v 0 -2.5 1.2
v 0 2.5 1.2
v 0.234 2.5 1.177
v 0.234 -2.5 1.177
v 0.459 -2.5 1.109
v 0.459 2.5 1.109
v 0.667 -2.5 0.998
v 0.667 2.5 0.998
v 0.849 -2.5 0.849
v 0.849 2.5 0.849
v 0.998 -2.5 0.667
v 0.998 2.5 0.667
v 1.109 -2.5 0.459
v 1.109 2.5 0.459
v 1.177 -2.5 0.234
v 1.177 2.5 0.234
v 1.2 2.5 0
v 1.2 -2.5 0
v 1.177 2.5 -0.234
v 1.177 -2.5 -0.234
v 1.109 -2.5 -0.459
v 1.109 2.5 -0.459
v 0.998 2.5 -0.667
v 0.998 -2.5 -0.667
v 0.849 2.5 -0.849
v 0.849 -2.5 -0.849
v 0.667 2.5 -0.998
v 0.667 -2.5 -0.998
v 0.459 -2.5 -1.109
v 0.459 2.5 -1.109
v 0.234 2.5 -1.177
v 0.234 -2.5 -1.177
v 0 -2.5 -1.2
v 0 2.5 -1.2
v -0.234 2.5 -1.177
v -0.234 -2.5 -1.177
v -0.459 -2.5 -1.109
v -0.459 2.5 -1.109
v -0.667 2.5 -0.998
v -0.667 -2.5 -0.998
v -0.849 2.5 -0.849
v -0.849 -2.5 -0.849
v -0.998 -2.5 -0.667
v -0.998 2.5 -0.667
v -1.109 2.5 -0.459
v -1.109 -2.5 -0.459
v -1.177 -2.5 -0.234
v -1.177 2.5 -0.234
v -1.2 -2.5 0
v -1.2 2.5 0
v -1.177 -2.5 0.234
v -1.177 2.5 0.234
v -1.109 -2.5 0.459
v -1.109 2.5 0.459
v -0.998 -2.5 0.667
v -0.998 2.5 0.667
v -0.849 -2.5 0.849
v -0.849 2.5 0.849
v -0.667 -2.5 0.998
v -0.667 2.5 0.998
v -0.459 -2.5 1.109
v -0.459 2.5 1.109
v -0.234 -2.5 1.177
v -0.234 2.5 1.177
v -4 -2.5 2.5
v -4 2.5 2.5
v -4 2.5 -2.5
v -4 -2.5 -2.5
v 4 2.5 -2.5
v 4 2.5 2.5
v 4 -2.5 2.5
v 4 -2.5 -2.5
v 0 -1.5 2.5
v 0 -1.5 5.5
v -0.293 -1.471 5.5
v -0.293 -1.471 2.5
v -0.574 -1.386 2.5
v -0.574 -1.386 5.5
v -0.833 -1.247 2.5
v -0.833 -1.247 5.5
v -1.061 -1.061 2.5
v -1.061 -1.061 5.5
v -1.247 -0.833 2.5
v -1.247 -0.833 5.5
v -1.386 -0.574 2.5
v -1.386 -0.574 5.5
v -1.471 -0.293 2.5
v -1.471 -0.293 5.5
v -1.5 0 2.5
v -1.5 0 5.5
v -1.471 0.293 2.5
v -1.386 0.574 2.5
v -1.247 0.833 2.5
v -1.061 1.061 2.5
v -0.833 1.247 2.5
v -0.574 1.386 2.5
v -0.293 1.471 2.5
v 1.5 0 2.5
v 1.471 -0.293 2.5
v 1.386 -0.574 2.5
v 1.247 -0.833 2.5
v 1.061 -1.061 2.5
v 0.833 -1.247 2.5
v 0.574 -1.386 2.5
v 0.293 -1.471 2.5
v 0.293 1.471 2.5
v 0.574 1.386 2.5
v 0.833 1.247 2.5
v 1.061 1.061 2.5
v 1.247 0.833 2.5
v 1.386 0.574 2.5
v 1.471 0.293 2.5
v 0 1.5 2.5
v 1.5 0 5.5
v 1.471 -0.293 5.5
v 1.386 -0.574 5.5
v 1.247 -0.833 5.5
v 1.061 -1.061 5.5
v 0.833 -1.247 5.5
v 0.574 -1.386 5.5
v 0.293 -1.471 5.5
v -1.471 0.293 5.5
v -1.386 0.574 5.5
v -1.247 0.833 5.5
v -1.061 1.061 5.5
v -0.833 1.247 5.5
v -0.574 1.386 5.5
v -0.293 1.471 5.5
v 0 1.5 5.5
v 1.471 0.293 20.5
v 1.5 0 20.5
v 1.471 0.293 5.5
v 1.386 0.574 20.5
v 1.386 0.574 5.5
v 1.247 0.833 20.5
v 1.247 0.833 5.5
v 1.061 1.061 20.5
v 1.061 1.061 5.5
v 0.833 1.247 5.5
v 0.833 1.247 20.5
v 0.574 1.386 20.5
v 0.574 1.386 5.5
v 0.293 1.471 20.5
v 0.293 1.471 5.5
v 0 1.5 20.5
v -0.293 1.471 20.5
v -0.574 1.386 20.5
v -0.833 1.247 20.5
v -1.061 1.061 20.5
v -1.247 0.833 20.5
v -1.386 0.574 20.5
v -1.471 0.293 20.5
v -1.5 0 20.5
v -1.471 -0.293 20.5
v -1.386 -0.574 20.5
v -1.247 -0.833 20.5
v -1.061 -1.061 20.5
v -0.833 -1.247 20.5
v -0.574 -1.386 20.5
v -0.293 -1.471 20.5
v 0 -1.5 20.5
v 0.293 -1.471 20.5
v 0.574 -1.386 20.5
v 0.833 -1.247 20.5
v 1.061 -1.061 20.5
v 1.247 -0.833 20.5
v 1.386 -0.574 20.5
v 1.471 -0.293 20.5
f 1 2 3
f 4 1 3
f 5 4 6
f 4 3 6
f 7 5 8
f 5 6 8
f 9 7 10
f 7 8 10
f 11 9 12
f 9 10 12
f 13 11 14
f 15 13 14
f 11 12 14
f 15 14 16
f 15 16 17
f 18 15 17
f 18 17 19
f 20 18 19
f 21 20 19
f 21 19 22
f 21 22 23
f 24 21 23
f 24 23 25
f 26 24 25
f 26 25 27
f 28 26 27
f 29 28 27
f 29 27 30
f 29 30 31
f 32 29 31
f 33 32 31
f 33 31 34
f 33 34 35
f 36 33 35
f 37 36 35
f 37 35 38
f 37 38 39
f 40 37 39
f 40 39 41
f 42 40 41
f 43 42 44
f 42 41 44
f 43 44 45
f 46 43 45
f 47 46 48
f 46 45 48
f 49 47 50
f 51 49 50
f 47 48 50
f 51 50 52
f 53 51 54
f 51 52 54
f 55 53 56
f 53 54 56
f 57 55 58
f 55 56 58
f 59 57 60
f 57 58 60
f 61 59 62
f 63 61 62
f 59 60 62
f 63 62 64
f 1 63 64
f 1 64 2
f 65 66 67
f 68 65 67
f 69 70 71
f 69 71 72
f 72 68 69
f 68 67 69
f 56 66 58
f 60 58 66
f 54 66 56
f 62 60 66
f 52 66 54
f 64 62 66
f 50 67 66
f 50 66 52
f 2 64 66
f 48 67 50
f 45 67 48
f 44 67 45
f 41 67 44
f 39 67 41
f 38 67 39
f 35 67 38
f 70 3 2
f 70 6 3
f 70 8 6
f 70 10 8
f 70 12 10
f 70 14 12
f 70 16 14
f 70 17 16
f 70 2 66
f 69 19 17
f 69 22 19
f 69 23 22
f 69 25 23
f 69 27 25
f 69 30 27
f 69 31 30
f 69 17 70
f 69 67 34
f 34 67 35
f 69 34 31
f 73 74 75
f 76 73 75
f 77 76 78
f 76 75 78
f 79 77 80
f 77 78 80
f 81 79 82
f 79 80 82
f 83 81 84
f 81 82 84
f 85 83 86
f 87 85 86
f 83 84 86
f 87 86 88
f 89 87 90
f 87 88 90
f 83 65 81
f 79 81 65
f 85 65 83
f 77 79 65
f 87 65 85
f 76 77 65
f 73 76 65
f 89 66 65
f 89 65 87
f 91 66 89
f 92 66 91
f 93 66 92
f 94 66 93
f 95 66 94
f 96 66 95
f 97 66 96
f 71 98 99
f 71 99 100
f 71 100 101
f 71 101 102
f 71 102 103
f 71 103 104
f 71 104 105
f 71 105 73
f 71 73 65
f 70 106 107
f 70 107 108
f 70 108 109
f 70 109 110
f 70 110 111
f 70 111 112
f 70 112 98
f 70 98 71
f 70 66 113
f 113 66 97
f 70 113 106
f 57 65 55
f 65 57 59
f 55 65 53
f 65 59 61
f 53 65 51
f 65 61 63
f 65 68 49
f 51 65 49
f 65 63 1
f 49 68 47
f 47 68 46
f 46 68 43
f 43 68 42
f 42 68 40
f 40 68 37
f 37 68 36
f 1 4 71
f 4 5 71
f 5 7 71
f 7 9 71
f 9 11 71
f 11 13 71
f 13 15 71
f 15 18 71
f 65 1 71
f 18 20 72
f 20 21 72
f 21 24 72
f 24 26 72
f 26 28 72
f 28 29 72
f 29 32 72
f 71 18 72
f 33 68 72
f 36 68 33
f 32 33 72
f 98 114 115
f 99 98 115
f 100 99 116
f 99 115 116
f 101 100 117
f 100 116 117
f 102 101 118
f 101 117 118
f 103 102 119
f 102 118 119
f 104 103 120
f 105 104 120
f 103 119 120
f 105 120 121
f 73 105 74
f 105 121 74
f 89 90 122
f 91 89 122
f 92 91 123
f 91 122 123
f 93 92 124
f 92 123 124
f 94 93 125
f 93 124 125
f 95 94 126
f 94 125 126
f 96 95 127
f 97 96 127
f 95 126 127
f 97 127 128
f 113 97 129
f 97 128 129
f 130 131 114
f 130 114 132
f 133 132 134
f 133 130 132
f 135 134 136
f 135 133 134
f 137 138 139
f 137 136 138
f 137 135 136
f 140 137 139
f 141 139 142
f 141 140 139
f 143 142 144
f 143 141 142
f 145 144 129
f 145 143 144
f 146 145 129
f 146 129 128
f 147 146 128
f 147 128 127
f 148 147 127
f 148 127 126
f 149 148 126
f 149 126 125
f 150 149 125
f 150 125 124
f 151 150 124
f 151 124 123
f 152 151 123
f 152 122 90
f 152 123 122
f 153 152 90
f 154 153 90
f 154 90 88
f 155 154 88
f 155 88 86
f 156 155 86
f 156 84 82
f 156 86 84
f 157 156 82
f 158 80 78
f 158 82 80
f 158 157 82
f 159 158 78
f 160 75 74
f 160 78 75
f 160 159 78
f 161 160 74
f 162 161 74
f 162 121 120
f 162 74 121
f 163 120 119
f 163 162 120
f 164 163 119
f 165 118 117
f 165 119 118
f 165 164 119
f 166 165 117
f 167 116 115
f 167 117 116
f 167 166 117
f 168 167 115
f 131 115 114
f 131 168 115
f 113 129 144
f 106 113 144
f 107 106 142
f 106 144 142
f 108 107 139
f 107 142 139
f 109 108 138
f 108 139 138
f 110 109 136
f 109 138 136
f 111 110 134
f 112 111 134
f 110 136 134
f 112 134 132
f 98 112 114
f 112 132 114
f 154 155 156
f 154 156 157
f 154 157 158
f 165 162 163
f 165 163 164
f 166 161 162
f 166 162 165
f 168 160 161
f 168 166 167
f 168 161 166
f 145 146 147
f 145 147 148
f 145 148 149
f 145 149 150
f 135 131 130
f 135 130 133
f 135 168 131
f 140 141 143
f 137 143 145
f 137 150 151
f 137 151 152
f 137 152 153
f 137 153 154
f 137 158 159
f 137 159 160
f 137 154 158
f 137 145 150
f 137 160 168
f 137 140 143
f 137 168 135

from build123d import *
from build123d.topology import SkipClean

# Parameters (mm, degrees)
SKETCH1_W           = 8
SKETCH1_H           = 5
BOSS_EXTRUDE1_DEPTH = 2.5
SKETCH2_W           = 3
SKETCH2_H           = 3
BOSS_EXTRUDE2_DEPTH = 1.5
CUT_EXTRUDE2_DEPTH  = 3
SKETCH5_R           = 1.2
CUT_EXTRUDE3_DEPTH  = 9.440971508
BOSS_EXTRUDE3_START = 15
SKETCH6_R           = 1.5
BOSS_EXTRUDE3_DEPTH = 15


with BuildPart() as part:
    # Sketch1 → Boss-Extrude1 (new, symmetric)
    with BuildSketch(Plane(origin=(0, 0, 0), x_dir=(1, 0, 0), z_dir=(0, 1, 0))):
        Rectangle(SKETCH1_W, SKETCH1_H)
    extrude(amount=BOSS_EXTRUDE1_DEPTH, both=True)

    # Sketch2 → Boss-Extrude2 (add, symmetric)
    with BuildSketch(Plane(origin=(0, 0, 0), x_dir=(1, 0, 0), z_dir=(0, 1, 0))):
        with Locations((0, -4)):
            Rectangle(SKETCH2_W, SKETCH2_H)
    extrude(amount=BOSS_EXTRUDE2_DEPTH, both=True)

    # Sketch3 → Cut-Extrude2 (cut)
    with BuildSketch(Plane.XY.offset(5.5)):
        with BuildLine():
            Line((-1.5, 1.5), (-1.5, 0))
            ThreePointArc((-1.5, 0), (-1.060660172, 1.060660172), (0, 1.5))
            Line((0, 1.5), (-1.5, 1.5))
        make_face()
        with BuildLine():
            ThreePointArc((0, 1.5), (1.060660172, 1.060660172), (1.5, 0))
            Line((1.5, 0), (1.5, 1.5))
            Line((1.5, 1.5), (0, 1.5))
        make_face()
        with BuildLine():
            ThreePointArc((1.5, 0), (1.060660172, -1.060660172), (0, -1.5))
            Line((0, -1.5), (1.5, -1.5))
            Line((1.5, -1.5), (1.5, 0))
        make_face()
        with BuildLine():
            Line((-1.5, 0), (-1.5, -1.5))
            Line((-1.5, -1.5), (0, -1.5))
            ThreePointArc((0, -1.5), (-1.060660172, -1.060660172), (-1.5, 0))
        make_face()
    extrude(amount=-CUT_EXTRUDE2_DEPTH, mode=Mode.SUBTRACT)

    # Sketch5 → Cut-Extrude3 (cut, through all)
    with BuildSketch(Plane(origin=(0, 2.5, 0), x_dir=(1, 0, 0), z_dir=(0, 1, 0))):
        with Locations(Location((0, 0, 0), (0, 0, 270))):
            Circle(SKETCH5_R)
    extrude(amount=-CUT_EXTRUDE3_DEPTH, mode=Mode.SUBTRACT)

    # Sketch6 → Boss-Extrude3 (add)
    with SkipClean():  # the faces are left unmerged after this step: merging them gives an invalid solid
        with BuildSketch(Plane.XY.offset(5.5).offset(BOSS_EXTRUDE3_START)):
            Circle(SKETCH6_R)
        extrude(amount=-BOSS_EXTRUDE3_DEPTH)


solid = part.part
